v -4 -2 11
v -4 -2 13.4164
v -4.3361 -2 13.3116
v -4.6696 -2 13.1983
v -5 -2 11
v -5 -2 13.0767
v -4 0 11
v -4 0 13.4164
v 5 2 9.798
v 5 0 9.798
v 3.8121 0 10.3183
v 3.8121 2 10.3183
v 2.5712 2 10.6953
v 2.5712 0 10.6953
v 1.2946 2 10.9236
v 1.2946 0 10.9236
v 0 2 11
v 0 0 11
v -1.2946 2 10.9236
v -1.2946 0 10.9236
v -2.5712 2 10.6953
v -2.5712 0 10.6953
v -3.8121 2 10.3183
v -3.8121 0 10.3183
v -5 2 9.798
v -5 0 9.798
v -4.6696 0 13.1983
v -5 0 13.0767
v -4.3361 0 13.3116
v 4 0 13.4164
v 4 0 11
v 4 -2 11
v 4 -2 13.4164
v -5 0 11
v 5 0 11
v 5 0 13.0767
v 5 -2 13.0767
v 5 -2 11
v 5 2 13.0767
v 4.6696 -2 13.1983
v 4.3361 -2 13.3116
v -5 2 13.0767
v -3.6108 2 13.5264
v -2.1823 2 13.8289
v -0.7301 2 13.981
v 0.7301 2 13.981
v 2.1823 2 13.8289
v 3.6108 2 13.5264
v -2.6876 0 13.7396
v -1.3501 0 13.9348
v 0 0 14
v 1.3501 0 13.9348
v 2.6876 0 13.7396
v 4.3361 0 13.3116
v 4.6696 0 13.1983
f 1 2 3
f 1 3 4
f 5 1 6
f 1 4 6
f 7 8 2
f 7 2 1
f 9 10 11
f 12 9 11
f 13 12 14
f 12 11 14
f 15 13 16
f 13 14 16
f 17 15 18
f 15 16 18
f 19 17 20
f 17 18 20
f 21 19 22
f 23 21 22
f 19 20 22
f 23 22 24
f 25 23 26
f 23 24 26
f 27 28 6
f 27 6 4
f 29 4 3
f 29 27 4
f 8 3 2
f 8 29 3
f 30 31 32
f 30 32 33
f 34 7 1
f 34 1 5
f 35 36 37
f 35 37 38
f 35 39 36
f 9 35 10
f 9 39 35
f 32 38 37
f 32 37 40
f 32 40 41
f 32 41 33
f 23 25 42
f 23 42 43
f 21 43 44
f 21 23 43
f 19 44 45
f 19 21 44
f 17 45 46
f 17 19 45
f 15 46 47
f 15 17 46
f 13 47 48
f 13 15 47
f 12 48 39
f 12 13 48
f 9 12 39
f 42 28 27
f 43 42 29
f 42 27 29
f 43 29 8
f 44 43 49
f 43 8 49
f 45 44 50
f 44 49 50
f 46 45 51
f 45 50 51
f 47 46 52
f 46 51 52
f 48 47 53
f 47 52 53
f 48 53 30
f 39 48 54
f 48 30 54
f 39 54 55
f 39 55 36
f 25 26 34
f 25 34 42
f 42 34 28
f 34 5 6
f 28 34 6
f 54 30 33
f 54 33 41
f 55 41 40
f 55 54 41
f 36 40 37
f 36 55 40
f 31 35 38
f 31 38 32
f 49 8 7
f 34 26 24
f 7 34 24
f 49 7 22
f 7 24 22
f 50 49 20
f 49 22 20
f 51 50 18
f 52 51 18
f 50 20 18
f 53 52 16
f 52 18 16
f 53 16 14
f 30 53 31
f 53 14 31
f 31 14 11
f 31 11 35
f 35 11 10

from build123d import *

# Parameters (mm, degrees)
BOSS_EXTRUDE1_DEPTH = 2
BOSS_EXTRUDE2_DEPTH = 2


with BuildPart() as part:
    # Sketch1 → Boss-Extrude1 (new body)
    with BuildSketch(Plane(origin=(0, 0, 0), x_dir=(1, 0, 0), z_dir=(0, 1, 0))):
        with BuildLine():
            Line((-5, -9.797958971), (-5, -13.076696831))
            ThreePointArc((-5, -13.076696831), (0, -14), (5, -13.076696831))
            Line((5, -13.076696831), (5, -9.797958971))
            ThreePointArc((5, -9.797958971), (0, -11), (-5, -9.797958971))
        make_face()
    extrude(amount=BOSS_EXTRUDE1_DEPTH)

    # Sketch3 → Boss-Extrude2 (add)
    with BuildSketch(Plane.XZ):
        with BuildLine():
            Line((5, 13.076696831), (5, 11))
            Line((5, 11), (4, 11))
            Line((4, 11), (4, 13.416407865))
            ThreePointArc((4, 13.416407865), (4.503204514, 13.255985407), (5, 13.076696831))
        make_face()
        with BuildLine():
            Line((-5, 11), (-5, 13.076696831))
            ThreePointArc((-5, 13.076696831), (-4.503204514, 13.255985407), (-4, 13.416407865))
            Line((-4, 13.416407865), (-4, 11))
            Line((-4, 11), (-5, 11))
        make_face()
    extrude(amount=BOSS_EXTRUDE2_DEPTH)


solid = part.part
